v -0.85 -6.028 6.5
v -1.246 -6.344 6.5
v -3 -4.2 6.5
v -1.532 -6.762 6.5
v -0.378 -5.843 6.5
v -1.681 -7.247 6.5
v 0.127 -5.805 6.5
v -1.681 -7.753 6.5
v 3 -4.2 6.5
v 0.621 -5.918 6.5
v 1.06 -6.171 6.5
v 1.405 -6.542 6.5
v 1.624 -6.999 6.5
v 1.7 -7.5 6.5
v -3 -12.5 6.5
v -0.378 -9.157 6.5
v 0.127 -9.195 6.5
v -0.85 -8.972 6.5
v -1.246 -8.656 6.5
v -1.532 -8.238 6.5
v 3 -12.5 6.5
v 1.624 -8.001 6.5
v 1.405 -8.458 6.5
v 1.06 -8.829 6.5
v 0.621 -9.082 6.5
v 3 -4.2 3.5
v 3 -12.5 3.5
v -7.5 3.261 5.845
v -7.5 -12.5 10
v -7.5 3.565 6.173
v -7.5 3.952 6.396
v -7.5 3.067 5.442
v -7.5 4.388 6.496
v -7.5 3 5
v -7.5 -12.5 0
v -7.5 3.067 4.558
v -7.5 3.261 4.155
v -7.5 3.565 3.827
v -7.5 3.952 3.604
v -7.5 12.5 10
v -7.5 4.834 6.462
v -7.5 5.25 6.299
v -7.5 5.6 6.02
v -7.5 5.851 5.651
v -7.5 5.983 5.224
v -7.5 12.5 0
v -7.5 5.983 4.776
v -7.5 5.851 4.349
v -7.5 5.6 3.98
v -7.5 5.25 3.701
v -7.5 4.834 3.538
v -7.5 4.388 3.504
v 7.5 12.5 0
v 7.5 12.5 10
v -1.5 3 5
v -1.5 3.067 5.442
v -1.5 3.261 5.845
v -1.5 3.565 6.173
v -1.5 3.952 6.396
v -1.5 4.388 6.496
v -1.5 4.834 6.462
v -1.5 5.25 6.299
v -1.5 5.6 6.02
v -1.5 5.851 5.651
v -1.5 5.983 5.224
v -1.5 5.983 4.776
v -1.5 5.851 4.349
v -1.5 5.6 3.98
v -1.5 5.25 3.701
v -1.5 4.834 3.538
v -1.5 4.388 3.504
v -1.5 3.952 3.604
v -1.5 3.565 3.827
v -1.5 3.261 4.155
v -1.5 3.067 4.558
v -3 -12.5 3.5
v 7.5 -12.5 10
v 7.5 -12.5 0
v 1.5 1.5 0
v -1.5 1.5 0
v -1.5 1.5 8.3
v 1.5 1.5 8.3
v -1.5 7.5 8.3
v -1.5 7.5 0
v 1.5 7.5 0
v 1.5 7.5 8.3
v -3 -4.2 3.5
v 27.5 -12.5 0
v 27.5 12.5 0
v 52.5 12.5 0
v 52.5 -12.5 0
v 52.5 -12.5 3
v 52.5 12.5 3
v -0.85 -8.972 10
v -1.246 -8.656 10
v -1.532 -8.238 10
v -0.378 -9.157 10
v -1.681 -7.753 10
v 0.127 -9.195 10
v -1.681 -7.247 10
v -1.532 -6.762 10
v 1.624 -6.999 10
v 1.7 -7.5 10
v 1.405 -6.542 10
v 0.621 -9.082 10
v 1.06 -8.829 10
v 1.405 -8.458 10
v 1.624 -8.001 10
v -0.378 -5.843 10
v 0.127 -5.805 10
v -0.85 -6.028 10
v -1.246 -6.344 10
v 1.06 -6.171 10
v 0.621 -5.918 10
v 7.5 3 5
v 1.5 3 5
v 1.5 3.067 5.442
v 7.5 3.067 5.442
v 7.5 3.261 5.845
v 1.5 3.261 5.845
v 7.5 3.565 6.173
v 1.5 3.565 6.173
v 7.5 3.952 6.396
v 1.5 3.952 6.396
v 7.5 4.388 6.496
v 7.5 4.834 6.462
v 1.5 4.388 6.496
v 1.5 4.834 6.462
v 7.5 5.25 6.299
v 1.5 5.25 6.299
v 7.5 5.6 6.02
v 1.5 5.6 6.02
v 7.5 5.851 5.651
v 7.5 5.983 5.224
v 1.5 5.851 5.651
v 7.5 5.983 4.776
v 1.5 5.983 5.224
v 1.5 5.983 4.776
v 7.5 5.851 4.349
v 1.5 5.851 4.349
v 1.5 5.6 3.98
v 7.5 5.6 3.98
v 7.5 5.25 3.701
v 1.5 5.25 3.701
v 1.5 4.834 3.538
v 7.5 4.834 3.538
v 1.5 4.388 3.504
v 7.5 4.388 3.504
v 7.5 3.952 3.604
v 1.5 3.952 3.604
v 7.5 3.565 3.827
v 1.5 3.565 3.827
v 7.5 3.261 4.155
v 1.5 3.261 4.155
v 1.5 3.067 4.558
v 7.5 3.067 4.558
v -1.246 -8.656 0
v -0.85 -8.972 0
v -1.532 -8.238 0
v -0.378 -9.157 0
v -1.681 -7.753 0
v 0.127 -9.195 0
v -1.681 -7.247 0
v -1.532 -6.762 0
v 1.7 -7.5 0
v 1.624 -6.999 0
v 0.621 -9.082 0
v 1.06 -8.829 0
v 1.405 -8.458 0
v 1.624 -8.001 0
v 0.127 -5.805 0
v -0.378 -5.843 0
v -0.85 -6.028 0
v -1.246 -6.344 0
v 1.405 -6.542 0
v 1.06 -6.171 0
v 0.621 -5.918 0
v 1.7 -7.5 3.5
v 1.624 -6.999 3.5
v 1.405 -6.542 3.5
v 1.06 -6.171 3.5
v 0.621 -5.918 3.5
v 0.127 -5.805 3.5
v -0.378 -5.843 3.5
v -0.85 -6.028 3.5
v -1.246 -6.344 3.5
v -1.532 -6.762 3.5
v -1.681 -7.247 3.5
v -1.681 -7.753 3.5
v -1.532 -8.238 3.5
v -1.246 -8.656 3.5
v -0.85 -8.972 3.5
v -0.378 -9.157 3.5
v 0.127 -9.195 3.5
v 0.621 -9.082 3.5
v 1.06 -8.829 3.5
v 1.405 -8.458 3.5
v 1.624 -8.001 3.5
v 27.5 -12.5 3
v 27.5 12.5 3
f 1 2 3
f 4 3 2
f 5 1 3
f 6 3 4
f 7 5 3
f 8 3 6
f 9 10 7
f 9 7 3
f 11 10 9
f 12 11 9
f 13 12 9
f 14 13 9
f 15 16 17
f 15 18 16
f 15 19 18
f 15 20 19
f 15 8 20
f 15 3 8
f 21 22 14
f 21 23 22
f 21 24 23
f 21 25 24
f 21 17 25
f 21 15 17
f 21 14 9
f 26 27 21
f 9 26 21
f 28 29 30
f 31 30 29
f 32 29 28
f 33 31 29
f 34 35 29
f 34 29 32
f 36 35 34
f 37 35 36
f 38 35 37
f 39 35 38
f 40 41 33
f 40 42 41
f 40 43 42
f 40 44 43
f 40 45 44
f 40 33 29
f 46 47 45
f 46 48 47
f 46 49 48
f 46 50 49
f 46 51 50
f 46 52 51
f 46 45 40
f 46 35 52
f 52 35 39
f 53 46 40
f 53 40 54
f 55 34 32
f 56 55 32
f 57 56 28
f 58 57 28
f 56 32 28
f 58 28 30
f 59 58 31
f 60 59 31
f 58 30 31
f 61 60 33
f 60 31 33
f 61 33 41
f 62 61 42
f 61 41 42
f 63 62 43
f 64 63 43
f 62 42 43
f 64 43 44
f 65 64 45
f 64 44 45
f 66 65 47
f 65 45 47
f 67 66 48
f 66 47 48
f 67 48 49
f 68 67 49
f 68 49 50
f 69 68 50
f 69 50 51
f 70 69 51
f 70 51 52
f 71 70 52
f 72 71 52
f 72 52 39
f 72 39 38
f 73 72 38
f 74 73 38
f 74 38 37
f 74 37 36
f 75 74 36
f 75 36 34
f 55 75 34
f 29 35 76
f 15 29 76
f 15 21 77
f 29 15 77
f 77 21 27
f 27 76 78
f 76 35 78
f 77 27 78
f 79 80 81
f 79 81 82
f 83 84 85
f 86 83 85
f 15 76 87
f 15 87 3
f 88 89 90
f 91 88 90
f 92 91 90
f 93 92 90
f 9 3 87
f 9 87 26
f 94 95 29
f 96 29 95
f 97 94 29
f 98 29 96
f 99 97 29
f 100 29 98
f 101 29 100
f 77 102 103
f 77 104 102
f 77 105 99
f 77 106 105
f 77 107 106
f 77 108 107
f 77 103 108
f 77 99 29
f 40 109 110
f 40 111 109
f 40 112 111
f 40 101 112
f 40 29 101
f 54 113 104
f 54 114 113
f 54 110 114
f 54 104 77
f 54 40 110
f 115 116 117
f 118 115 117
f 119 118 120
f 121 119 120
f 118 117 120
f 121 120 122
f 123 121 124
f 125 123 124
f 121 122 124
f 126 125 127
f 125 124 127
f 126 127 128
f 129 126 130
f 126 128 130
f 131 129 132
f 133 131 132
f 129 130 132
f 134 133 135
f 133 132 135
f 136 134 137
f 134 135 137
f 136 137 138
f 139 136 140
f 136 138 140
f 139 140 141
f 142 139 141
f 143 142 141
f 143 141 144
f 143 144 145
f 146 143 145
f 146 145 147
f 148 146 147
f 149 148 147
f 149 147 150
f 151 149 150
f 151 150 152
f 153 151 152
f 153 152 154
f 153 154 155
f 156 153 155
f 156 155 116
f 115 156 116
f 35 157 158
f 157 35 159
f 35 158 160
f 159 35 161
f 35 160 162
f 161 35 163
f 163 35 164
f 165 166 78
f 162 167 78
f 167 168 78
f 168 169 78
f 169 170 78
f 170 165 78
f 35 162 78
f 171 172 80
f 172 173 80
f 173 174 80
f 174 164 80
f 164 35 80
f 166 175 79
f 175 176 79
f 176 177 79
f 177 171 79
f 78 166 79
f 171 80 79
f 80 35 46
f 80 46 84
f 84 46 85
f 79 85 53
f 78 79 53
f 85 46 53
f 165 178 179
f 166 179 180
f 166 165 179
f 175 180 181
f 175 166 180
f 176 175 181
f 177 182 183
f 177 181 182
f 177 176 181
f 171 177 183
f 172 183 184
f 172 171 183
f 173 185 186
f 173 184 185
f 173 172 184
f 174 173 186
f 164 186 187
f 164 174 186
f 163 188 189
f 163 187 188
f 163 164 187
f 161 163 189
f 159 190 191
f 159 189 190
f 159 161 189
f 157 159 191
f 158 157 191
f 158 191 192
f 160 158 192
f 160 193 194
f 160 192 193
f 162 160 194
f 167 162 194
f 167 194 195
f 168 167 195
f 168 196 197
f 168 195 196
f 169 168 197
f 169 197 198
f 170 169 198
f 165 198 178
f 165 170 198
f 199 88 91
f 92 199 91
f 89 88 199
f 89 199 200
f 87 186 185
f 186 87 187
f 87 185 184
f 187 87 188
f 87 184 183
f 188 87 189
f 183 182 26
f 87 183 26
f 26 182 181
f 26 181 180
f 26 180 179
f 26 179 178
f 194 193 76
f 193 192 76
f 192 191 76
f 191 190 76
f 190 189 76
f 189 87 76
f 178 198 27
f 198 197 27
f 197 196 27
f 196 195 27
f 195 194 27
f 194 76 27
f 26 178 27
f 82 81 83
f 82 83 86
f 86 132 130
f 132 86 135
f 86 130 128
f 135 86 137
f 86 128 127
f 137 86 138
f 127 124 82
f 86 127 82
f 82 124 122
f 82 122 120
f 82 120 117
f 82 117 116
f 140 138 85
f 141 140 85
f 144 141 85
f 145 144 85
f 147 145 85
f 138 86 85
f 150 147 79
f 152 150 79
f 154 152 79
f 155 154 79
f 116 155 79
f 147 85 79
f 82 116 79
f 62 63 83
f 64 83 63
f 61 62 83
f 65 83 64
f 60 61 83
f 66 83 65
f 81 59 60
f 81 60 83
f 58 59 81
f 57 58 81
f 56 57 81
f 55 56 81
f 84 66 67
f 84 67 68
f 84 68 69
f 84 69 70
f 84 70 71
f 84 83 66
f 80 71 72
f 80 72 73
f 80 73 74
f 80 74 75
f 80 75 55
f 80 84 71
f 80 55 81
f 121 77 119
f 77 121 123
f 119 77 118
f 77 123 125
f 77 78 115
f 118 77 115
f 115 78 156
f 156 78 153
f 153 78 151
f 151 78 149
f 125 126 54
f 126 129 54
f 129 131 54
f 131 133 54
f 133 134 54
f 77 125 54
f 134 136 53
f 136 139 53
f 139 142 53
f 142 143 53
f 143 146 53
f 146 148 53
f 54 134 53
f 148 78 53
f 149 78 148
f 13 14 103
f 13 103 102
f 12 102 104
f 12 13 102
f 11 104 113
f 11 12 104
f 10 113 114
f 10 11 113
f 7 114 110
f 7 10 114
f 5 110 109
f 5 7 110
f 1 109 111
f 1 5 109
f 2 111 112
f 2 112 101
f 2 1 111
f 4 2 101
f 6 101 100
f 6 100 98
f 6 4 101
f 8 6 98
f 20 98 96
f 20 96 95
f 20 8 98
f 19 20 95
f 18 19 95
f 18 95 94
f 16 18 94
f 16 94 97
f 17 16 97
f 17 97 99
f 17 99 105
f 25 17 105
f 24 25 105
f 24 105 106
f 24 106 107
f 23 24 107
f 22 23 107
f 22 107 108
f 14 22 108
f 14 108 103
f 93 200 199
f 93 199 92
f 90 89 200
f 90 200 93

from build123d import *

# Parameters (mm, degrees)
F0_W     = 15
F0_H     = 25
F0_R     = 1.7
F1_DEPTH = 10
F2_W     = 6
F2_H     = 3
F3_DEPTH = 8.3
F4_R     = 1.5
F5_DEPTH = 15
F6_W     = 3
F6_H     = 6
F7_DEPTH = 8.3
F0_W_2   = 25
F8_DEPTH = 3


with BuildPart() as f1:
    # F0 (on Top) → F1 (new body)
    with BuildSketch(Plane.XY):
        Rectangle(F0_W, F0_H)
        with Locations((0, -7.5)):
            Circle(F0_R, mode=Mode.SUBTRACT)
    extrude(amount=F1_DEPTH)

    # F2 (on face) → F3 (cut)
    with BuildSketch(Plane.XZ.offset(12.5)):
        with Locations((0, 5)):
            Rectangle(F2_W, F2_H)
    extrude(amount=-F3_DEPTH, mode=Mode.SUBTRACT)

    # F4 (on face) → F5 (cut, through all)
    with BuildSketch(Plane(origin=(-7.5, 0, 0), x_dir=(0, -1, 0), z_dir=(-1, 0, 0))):
        with Locations((-4.5, 5)):
            Circle(F4_R)
    extrude(amount=-F5_DEPTH, mode=Mode.SUBTRACT)

    # F6 (on face) → F7 (cut)
    with BuildSketch(Plane(origin=(0, 0, 0), x_dir=(1, 0, 0), z_dir=(0, 0, -1))):
        with Locations((0, -4.5)):
            Rectangle(F6_W, F6_H)
    extrude(amount=-F7_DEPTH, mode=Mode.SUBTRACT)


with BuildPart() as f8:
    # F0 (on Top) → F8 (new body)
    with BuildSketch(Plane.XY):
        with Locations((40, 0)):
            Rectangle(F0_W_2, F0_H)
    extrude(amount=F8_DEPTH)


solid = Compound([f1.part, f8.part])
